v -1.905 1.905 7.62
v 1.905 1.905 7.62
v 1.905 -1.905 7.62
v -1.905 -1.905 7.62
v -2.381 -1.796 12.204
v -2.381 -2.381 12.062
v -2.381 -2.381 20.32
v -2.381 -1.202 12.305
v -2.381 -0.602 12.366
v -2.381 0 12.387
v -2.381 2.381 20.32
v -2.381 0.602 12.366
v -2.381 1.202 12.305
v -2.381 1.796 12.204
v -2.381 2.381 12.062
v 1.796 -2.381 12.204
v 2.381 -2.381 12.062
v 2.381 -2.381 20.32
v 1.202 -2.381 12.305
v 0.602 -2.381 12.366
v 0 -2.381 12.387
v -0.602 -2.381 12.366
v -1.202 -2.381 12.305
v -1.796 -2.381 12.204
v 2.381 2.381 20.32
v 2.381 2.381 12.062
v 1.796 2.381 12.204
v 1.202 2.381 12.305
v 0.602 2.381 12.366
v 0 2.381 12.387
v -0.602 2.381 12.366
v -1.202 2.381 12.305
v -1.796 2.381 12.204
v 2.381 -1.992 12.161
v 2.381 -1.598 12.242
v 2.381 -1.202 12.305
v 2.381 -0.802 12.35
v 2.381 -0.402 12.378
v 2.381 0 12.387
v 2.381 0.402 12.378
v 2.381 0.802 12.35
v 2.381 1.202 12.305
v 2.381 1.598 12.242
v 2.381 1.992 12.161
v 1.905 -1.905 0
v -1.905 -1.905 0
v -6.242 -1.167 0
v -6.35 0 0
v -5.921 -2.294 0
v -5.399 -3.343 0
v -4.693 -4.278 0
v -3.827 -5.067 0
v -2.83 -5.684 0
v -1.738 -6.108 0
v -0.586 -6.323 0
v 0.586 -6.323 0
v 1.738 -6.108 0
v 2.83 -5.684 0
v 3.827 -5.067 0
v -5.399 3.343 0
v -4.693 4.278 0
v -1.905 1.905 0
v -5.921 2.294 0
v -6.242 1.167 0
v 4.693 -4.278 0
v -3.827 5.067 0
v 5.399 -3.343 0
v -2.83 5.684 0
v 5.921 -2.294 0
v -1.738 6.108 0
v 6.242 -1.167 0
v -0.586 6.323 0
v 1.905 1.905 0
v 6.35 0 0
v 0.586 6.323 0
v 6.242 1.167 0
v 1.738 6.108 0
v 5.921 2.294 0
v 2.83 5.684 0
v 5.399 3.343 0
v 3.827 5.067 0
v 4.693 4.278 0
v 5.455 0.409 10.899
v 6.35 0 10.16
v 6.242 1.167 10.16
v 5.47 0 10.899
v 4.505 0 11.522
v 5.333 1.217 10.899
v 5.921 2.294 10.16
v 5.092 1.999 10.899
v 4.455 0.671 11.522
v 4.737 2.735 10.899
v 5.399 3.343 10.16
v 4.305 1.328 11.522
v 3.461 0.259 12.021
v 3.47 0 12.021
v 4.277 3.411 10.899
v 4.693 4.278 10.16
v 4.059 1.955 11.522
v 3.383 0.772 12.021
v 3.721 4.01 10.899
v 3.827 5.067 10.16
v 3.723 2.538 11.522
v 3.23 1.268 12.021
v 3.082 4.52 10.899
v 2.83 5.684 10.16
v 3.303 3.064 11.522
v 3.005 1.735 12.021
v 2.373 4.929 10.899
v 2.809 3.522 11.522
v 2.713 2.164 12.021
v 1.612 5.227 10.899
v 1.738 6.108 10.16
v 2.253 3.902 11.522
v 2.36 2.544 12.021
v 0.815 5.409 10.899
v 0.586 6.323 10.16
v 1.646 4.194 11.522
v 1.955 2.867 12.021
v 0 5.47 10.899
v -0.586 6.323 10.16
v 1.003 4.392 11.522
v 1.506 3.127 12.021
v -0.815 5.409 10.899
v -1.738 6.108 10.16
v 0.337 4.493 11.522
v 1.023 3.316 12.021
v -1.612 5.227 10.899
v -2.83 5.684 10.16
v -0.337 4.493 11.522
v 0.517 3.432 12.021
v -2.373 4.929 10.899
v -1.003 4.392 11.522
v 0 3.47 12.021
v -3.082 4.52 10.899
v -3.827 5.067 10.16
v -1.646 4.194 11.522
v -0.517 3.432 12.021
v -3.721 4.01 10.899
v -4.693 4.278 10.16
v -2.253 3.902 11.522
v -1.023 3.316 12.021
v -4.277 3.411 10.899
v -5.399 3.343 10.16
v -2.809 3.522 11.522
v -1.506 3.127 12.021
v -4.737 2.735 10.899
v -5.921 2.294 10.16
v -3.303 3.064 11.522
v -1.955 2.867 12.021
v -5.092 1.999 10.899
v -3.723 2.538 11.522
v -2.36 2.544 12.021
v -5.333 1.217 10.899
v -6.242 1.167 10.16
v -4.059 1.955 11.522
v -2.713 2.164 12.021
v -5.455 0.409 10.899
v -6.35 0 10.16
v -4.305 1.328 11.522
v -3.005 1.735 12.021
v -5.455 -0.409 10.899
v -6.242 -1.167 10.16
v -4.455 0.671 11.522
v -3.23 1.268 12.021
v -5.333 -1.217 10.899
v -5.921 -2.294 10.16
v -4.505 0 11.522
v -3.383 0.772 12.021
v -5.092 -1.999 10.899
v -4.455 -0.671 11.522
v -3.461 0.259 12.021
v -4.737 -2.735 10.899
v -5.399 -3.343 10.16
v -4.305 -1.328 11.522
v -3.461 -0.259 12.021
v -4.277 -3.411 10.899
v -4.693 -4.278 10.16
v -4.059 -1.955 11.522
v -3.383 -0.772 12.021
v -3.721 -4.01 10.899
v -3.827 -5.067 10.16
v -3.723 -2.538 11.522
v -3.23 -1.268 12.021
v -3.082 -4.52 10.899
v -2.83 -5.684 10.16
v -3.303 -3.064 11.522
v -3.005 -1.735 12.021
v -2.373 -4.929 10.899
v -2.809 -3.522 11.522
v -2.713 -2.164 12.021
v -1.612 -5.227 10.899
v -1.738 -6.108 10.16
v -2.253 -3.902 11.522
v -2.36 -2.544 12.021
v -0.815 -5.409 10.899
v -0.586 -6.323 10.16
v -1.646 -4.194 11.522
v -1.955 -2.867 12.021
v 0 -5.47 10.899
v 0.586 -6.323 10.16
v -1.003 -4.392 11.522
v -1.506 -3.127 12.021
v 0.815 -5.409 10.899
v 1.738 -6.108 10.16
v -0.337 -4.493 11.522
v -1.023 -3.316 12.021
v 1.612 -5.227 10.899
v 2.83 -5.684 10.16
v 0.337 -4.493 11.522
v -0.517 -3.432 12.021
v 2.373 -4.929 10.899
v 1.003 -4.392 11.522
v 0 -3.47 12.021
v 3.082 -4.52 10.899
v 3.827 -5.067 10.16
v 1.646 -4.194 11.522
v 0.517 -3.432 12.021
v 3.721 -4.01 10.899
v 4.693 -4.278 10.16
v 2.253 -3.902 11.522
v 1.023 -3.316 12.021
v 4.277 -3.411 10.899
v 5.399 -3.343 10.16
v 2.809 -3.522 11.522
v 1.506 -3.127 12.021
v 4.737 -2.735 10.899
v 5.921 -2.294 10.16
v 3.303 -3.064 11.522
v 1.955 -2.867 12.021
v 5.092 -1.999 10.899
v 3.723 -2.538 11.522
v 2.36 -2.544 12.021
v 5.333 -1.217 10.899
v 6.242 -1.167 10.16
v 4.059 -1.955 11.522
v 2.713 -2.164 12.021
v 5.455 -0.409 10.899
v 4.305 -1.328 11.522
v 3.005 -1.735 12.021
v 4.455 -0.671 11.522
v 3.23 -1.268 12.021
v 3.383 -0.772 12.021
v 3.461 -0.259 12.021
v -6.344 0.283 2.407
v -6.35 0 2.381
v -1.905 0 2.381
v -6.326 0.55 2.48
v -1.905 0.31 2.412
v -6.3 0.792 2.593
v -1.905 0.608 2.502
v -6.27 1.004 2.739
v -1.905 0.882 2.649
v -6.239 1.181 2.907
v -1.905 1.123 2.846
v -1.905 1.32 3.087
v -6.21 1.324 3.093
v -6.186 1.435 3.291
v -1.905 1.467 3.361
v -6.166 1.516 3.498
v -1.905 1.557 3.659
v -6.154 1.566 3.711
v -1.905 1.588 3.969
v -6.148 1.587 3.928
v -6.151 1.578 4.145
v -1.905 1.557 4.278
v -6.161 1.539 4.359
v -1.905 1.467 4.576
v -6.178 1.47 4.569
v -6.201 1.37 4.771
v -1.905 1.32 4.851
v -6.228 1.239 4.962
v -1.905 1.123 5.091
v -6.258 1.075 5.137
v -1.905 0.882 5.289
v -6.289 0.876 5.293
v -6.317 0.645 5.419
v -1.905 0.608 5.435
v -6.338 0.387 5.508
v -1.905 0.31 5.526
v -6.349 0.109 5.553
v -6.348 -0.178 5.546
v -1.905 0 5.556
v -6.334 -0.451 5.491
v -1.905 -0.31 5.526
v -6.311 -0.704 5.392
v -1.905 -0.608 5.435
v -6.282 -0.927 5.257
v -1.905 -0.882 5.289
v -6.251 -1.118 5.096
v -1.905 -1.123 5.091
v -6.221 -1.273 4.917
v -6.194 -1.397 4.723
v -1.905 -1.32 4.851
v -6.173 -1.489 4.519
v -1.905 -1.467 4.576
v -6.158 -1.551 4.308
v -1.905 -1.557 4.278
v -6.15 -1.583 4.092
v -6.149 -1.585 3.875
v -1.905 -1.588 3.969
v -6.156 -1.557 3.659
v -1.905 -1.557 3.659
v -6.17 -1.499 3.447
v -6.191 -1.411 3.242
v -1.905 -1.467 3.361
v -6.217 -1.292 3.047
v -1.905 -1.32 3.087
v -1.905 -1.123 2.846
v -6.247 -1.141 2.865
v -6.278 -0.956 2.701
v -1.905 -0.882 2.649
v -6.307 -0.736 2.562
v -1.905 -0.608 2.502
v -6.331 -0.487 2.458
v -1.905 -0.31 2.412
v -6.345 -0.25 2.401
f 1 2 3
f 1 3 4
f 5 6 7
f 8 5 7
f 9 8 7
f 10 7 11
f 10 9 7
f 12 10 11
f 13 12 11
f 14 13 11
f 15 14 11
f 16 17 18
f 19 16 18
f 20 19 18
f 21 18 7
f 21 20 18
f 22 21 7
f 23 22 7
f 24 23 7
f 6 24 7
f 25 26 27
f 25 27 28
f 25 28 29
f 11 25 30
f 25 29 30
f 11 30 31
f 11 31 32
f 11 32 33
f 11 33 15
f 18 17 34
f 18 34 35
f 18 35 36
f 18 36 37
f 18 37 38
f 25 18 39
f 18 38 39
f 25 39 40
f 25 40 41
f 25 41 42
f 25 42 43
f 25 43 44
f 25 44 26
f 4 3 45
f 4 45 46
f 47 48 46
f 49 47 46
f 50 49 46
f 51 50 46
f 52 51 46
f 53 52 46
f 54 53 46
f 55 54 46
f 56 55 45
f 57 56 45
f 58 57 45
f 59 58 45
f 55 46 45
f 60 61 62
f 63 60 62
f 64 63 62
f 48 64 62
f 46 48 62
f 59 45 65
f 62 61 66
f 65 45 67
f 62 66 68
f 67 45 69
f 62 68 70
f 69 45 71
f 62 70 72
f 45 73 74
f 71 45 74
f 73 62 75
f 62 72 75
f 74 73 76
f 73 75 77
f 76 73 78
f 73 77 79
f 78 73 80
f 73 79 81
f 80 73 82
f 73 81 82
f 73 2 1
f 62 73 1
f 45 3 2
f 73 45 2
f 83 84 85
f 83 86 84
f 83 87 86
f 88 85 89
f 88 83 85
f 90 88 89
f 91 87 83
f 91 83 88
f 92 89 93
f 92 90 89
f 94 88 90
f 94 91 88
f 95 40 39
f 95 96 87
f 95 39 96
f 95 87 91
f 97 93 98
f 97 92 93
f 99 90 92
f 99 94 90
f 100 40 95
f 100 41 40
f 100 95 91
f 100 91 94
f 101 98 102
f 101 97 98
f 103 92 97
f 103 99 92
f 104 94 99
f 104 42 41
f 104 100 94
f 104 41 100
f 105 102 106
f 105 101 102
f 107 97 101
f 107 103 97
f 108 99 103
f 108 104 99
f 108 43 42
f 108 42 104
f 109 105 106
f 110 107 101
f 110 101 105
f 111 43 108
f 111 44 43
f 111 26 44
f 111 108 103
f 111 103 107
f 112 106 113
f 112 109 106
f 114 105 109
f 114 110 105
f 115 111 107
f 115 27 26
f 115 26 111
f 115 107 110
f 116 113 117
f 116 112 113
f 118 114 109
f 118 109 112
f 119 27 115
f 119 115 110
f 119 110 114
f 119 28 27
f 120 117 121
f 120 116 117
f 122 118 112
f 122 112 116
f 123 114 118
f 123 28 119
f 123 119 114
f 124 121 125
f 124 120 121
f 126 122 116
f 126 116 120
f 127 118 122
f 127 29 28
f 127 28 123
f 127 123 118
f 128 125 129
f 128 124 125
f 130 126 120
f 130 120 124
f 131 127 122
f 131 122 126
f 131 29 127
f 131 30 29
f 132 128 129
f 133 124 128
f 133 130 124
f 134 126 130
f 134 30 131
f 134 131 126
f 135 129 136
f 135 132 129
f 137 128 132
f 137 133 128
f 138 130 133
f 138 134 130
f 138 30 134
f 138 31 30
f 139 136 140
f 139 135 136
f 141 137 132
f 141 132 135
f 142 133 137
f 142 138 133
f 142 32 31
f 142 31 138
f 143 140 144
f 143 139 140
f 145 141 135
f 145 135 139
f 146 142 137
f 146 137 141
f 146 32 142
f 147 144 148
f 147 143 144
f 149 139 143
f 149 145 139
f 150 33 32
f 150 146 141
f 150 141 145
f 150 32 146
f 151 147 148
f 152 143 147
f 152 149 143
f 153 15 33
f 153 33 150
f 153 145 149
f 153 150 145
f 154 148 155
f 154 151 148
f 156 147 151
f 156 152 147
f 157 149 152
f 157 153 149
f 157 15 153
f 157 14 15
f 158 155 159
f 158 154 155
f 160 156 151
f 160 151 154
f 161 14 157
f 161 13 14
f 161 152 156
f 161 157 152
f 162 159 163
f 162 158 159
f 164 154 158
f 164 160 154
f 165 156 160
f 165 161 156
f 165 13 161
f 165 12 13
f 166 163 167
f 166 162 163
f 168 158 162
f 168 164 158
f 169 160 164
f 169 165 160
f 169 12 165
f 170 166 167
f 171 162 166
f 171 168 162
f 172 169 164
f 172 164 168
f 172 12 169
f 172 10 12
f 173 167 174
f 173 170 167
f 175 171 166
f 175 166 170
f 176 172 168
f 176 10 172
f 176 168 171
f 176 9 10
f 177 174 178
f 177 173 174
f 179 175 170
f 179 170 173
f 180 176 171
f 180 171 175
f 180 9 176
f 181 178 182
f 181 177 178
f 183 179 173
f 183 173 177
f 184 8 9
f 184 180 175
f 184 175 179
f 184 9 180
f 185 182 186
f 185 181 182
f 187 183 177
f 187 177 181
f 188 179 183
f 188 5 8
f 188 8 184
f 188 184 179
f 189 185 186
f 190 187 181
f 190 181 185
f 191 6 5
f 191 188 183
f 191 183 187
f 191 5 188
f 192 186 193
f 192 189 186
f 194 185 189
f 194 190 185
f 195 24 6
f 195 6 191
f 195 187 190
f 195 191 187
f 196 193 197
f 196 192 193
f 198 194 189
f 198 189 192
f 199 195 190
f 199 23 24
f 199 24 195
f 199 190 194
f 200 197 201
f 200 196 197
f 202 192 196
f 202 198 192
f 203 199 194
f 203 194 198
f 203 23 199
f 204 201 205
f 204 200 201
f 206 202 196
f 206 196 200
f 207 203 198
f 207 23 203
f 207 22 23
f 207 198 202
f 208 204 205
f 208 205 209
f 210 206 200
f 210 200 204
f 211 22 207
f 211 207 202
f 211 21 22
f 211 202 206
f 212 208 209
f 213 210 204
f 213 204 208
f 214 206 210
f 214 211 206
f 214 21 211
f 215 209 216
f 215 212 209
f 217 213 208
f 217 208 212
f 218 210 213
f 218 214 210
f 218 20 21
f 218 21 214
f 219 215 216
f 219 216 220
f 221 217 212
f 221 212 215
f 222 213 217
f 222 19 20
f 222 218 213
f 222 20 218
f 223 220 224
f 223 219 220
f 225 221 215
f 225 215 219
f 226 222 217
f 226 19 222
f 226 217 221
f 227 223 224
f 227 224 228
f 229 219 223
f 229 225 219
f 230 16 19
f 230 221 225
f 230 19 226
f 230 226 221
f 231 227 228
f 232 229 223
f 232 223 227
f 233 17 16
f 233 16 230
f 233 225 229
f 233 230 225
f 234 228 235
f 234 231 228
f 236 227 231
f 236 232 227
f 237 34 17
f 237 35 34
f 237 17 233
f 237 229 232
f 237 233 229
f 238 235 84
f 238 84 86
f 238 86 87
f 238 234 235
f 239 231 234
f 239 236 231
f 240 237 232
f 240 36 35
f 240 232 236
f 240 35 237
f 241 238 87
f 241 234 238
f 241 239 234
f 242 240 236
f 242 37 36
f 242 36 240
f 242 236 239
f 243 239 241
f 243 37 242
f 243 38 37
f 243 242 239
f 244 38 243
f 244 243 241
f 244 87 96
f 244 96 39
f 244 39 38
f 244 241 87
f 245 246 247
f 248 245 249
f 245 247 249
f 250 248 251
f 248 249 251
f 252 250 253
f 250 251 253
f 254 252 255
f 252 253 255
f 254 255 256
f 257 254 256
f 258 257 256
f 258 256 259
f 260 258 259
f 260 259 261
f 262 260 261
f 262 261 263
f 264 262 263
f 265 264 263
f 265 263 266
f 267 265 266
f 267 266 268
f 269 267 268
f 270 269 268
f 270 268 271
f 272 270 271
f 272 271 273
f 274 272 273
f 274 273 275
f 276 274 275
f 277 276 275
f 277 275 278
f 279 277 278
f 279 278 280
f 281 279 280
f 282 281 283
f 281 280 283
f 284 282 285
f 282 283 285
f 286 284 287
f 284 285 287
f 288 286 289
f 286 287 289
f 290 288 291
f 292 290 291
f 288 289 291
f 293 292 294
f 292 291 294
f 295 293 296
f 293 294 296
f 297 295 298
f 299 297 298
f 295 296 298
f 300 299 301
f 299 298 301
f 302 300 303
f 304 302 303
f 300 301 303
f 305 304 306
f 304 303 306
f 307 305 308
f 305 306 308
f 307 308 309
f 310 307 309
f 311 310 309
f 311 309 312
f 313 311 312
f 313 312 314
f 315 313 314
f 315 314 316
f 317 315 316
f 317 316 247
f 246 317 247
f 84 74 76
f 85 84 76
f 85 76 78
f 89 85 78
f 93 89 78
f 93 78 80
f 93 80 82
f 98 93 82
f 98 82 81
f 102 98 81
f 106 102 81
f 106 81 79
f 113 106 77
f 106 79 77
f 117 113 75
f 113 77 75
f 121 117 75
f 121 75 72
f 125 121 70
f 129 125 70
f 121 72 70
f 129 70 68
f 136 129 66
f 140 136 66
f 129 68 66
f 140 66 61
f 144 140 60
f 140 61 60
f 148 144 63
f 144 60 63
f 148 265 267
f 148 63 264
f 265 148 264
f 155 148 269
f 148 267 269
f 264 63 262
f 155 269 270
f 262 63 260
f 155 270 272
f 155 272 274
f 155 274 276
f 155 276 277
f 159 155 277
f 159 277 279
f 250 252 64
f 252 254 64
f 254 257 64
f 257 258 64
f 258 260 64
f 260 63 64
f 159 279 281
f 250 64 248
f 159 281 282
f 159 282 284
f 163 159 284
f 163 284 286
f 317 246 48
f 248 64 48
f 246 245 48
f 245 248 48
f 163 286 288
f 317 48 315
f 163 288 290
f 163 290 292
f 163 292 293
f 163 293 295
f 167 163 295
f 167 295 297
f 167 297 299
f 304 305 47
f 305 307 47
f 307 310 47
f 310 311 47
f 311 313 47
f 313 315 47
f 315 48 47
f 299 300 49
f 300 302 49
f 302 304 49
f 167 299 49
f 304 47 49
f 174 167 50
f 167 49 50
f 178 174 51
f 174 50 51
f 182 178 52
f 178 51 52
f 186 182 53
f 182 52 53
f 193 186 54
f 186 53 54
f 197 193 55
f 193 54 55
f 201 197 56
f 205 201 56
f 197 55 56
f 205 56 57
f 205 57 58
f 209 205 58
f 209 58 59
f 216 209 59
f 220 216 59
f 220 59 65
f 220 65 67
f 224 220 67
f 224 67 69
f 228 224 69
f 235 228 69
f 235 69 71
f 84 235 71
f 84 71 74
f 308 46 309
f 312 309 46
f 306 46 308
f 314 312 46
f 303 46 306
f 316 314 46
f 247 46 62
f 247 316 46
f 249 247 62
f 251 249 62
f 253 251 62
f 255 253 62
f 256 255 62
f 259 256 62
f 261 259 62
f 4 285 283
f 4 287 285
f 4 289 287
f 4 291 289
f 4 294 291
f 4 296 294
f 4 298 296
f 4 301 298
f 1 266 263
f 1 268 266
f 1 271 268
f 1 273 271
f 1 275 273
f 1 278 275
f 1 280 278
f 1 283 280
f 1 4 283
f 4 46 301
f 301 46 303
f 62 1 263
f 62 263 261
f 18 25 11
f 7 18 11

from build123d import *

# Parameters (mm, degrees)
SKETCH1_R           = 6.35
BOSS_EXTRUDE1_DEPTH = 10.16
DOME1_FACE_RADIUS   = 6.35
DOME1_HEIGHT        = 2.54
SKETCH3_W           = 3.81
SKETCH3_H           = 3.81
CUT_EXTRUDE1_DEPTH  = 7.62
SKETCH5_W           = 4.7625
SKETCH5_H           = 4.7625
BOSS_EXTRUDE2_DEPTH = 12.7
SKETCH6_R           = 1.5875
CUT_EXTRUDE2_DEPTH  = 12.7


with BuildPart() as part:
    # Sketch1 → Boss-Extrude1 (new body)
    with BuildSketch(Plane.XY):
        Circle(SKETCH1_R)
    extrude(amount=BOSS_EXTRUDE1_DEPTH)

    # Dome1: a dome of height H over a round flat face of radius A is a cap of a sphere of radius (A * A + H * H) / (2 * H)
    dome1_r = (DOME1_FACE_RADIUS * DOME1_FACE_RADIUS + DOME1_HEIGHT * DOME1_HEIGHT) / (2 * DOME1_HEIGHT)
    dome1_base = Plane((0, 0, 10.16), z_dir=(0, 0, 1))
    with Locations(dome1_base.offset(DOME1_HEIGHT - dome1_r)):
        dome1_ball = Sphere(dome1_r, mode=Mode.PRIVATE)
    add(split(dome1_ball, bisect_by=dome1_base, keep=Keep.TOP, mode=Mode.PRIVATE))

    # Sketch3 → Cut-Extrude1 (cut)
    with BuildSketch(Plane(origin=(0, 0, 7.62), x_dir=(-1, 0, 0), z_dir=(0, 0, -1))):
        Rectangle(SKETCH3_W, SKETCH3_H)
    extrude(amount=CUT_EXTRUDE1_DEPTH, mode=Mode.SUBTRACT)

    # Sketch5 → Boss-Extrude2 (add)
    with BuildSketch(Plane(origin=(0, 0, 7.62), x_dir=(-1, 0, 0), z_dir=(0, 0, -1))):
        Rectangle(SKETCH5_W, SKETCH5_H)
    extrude(amount=-BOSS_EXTRUDE2_DEPTH)

    # Sketch6 → Cut-Extrude2 (cut)
    with BuildSketch(Plane(origin=(-1.905, 0, 0), x_dir=(0, 0, -1), z_dir=(1, 0, 0))):
        with Locations((-3.96875, 0)):
            Circle(SKETCH6_R)
    extrude(amount=-CUT_EXTRUDE2_DEPTH, mode=Mode.SUBTRACT)


solid = part.part
